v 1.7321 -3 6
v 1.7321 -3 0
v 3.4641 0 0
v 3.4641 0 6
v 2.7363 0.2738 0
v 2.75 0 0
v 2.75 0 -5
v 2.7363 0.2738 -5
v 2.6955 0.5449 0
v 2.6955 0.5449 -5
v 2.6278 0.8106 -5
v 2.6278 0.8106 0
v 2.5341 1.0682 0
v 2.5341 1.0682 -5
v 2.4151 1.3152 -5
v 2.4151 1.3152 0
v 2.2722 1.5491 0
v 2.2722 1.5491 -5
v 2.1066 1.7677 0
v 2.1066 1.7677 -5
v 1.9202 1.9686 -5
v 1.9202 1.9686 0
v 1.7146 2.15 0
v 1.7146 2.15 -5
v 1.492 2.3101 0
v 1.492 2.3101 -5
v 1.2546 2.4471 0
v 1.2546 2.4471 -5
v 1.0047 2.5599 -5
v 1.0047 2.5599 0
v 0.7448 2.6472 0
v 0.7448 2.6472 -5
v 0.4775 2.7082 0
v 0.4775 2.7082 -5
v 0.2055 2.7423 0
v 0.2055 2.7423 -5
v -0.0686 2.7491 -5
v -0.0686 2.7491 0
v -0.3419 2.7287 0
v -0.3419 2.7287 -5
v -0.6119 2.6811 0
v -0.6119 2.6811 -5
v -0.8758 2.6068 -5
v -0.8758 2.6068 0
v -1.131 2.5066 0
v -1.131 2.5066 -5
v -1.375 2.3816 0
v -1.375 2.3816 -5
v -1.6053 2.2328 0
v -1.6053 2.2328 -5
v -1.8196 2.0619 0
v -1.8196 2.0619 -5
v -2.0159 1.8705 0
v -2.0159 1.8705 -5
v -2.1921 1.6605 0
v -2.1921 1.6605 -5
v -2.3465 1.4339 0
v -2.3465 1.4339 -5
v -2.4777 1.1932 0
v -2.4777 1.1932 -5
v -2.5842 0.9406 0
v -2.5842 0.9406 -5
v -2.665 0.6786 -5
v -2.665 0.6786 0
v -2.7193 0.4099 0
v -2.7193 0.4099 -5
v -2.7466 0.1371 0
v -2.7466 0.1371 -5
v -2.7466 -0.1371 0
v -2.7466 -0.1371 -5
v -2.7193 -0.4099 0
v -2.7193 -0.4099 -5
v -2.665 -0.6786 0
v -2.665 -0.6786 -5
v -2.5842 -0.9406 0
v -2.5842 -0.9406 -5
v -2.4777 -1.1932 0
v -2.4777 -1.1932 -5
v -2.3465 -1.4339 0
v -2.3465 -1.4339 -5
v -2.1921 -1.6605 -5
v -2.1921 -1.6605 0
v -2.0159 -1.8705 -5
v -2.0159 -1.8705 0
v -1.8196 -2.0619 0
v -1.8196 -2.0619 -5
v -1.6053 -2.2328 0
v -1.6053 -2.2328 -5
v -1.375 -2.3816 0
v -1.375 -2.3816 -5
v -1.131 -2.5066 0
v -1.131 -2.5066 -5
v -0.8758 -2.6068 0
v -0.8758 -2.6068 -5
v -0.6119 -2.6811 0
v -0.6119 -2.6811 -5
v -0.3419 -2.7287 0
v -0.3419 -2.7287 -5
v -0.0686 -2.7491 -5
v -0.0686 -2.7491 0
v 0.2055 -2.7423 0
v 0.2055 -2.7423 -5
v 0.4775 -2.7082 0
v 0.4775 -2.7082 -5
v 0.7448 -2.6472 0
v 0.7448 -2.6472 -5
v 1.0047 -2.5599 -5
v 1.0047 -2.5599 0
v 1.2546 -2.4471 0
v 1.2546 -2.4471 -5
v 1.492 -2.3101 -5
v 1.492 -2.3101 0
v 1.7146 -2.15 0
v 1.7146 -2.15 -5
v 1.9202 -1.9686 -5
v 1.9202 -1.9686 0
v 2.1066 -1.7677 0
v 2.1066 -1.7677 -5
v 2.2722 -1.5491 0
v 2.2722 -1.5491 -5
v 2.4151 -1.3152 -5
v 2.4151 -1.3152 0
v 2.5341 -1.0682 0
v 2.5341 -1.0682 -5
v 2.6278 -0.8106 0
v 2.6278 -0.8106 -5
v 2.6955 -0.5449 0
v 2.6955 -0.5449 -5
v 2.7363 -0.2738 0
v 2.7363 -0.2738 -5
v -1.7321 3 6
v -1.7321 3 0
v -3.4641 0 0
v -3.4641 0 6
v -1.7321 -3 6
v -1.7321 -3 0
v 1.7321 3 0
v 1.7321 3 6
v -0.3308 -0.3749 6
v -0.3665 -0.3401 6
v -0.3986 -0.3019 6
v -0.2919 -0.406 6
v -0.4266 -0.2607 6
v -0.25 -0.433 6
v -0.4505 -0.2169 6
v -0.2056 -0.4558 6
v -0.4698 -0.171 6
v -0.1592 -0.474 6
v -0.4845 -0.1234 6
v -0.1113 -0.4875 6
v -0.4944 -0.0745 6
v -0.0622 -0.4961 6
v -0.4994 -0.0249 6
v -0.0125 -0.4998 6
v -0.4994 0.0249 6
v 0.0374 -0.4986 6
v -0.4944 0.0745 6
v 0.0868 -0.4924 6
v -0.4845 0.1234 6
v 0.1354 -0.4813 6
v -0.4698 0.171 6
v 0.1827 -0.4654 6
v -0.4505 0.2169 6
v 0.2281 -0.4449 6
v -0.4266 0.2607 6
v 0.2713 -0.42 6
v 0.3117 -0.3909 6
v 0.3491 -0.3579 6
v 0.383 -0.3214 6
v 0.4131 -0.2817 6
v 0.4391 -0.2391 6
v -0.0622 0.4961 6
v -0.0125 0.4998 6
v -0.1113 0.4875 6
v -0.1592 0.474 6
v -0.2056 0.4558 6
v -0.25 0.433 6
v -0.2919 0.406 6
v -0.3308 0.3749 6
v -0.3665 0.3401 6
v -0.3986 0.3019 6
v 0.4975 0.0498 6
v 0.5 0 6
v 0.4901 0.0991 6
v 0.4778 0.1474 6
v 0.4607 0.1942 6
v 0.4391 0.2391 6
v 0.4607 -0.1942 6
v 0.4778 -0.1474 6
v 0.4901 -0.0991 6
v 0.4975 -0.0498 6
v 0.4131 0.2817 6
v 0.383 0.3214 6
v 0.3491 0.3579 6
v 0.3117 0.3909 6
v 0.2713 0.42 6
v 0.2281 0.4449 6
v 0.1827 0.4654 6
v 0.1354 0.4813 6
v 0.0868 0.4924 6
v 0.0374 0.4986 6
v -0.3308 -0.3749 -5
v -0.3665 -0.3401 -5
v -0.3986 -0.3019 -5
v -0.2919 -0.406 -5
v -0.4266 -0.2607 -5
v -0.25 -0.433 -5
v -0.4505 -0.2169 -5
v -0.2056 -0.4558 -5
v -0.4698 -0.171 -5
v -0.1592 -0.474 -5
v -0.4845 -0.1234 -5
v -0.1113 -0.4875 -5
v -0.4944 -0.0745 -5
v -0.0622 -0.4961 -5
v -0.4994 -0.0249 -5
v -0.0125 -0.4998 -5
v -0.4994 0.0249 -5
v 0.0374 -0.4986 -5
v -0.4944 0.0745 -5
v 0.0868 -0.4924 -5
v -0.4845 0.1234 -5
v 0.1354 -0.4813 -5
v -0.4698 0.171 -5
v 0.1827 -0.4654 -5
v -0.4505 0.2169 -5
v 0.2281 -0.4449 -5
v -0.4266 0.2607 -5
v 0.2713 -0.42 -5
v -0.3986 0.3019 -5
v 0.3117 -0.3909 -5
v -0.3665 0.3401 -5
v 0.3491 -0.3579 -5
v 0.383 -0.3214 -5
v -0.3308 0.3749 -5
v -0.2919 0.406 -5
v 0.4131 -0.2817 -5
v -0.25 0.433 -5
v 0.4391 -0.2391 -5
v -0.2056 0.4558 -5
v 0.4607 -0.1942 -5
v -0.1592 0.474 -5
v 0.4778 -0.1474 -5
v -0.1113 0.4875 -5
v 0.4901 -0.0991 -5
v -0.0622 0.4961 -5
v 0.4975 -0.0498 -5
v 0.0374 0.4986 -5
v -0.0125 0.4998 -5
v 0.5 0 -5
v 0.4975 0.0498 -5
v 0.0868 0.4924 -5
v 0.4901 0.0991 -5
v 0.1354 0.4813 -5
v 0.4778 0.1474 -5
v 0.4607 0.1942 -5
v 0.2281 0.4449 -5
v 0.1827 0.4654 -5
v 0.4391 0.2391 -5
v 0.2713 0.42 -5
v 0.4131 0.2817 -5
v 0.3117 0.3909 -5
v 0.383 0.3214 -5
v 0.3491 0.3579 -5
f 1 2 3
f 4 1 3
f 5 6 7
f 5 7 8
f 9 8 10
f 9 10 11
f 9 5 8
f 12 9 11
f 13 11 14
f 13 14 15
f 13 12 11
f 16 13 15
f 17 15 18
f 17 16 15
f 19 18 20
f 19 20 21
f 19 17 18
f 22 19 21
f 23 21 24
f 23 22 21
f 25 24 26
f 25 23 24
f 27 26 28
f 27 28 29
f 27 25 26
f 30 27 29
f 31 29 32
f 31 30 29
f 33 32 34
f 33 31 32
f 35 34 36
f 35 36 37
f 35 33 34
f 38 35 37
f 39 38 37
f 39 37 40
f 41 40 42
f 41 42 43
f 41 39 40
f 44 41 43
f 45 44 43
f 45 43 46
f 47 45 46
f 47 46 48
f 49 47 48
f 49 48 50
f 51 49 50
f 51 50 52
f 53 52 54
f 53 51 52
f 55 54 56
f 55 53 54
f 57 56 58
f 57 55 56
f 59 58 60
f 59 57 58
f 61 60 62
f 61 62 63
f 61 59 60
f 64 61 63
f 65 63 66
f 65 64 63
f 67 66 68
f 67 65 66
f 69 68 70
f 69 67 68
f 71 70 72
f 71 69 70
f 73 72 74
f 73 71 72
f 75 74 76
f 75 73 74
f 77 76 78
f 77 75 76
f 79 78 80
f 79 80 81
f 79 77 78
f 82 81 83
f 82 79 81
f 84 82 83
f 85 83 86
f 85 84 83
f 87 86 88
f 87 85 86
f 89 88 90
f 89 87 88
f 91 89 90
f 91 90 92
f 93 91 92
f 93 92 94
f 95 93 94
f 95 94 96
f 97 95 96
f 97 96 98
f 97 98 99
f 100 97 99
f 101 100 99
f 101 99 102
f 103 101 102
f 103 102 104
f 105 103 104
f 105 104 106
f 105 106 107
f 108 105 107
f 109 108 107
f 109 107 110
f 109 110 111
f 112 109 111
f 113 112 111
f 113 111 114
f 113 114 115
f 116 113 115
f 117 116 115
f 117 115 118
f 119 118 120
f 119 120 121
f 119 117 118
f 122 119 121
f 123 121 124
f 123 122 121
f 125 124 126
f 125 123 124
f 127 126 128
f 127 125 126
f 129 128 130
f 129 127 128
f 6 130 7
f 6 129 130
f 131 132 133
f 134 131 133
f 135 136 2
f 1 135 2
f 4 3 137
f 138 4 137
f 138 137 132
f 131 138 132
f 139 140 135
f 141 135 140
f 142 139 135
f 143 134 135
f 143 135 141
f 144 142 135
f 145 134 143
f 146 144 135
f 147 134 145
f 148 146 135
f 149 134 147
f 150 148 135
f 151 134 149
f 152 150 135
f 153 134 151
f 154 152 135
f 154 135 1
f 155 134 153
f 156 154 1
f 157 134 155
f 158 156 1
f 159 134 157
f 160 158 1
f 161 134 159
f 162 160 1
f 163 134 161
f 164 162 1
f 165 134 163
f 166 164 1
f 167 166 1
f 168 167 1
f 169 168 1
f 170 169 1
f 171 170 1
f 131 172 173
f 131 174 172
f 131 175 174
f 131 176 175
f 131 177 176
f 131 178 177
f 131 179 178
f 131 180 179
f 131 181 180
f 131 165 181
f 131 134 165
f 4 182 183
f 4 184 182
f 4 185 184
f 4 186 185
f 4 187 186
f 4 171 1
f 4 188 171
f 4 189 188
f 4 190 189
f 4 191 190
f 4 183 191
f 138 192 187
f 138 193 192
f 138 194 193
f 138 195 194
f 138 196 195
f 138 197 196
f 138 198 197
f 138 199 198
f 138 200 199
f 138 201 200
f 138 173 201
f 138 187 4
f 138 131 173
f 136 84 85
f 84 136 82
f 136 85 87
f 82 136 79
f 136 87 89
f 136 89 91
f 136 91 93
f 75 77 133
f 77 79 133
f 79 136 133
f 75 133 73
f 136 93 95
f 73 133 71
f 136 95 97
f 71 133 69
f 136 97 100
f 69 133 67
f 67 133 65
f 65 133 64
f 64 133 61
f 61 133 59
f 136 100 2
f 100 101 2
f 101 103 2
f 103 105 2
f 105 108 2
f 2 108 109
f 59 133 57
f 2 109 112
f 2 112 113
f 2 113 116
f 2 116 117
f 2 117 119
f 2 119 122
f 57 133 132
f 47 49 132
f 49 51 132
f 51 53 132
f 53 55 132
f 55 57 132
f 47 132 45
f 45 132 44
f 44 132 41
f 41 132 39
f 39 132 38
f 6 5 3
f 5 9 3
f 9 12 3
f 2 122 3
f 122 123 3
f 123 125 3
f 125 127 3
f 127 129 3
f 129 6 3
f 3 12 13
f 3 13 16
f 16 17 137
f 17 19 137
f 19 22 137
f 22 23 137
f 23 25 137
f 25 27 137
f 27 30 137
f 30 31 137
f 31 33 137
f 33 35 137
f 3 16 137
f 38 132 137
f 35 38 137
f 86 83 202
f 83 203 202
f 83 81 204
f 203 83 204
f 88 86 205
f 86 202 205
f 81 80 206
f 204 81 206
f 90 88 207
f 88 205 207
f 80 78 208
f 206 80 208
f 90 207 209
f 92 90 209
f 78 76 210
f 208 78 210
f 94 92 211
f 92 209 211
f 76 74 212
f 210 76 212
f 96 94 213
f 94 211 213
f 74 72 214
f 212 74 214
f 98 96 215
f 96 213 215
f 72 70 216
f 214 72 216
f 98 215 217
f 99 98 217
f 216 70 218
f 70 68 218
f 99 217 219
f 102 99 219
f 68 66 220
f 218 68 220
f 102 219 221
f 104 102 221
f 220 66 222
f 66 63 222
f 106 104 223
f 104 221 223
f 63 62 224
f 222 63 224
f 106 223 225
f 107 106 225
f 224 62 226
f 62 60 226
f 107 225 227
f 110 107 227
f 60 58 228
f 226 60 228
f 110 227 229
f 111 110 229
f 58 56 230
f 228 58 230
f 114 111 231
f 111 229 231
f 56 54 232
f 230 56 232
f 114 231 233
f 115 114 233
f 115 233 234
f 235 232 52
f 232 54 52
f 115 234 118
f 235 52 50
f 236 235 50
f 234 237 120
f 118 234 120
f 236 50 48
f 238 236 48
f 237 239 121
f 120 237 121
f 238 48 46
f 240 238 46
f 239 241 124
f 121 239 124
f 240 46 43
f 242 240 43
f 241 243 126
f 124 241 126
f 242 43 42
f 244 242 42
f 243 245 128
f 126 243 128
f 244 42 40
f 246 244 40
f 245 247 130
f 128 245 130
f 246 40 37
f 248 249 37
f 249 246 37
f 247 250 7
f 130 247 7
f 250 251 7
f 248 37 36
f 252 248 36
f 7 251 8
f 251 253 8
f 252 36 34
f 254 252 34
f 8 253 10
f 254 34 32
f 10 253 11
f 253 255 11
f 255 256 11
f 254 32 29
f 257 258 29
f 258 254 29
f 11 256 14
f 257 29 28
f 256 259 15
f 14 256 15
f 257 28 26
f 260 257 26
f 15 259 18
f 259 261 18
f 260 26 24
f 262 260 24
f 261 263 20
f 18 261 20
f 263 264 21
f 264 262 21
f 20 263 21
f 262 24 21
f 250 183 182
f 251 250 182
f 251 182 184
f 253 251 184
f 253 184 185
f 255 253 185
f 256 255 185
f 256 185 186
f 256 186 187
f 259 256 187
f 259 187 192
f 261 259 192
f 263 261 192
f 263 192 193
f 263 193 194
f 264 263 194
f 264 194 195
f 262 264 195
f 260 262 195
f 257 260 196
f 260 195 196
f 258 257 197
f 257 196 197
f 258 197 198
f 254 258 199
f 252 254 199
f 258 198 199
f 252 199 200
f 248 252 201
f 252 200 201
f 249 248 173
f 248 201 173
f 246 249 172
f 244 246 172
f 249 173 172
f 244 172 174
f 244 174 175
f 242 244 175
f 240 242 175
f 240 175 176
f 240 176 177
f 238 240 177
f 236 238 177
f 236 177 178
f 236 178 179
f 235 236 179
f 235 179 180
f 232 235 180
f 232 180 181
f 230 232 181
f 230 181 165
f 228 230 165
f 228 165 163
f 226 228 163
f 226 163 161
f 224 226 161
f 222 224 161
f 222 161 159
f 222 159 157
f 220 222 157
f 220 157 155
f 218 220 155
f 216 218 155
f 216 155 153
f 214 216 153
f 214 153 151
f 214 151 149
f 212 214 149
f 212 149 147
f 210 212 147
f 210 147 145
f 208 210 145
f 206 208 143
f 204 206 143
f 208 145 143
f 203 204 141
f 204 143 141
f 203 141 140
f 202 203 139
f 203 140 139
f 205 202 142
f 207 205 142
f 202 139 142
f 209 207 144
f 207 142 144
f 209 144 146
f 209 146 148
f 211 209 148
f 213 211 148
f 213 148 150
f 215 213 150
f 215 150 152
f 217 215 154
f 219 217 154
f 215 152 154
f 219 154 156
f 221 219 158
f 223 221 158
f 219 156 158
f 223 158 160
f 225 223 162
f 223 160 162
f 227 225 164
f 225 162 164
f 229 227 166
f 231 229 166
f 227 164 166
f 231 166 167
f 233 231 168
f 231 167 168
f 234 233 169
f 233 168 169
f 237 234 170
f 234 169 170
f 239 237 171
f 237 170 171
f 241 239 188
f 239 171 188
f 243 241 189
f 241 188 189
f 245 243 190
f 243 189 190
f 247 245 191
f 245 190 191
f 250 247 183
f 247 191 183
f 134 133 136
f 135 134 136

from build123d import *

# Parameters (mm, degrees)
F0_R     = 2.75
F1_DEPTH = 5
F3_DEPTH = 6
F4_R     = 0.5
F5_DEPTH = 11.001


with BuildPart() as f1:
    # F0 (on Top) → F1 (new body)
    with BuildSketch(Plane.XY):
        Circle(F0_R)
    extrude(amount=-F1_DEPTH)

    # F2 (on Top) → F3 (join)
    with BuildSketch(Plane.XY):
        Polygon((1.732051, -3), (3.464102, 0), (1.732051, 3), (-1.732051, 3), (-3.464102, 0), (-1.732051, -3), align=None)
    extrude(amount=F3_DEPTH)

    # F4 (on face) → F5 (cut, through all)
    with BuildSketch(Plane.XY.offset(6)):
        Circle(F4_R)
    extrude(amount=-F5_DEPTH, mode=Mode.SUBTRACT)


solid = f1.part
